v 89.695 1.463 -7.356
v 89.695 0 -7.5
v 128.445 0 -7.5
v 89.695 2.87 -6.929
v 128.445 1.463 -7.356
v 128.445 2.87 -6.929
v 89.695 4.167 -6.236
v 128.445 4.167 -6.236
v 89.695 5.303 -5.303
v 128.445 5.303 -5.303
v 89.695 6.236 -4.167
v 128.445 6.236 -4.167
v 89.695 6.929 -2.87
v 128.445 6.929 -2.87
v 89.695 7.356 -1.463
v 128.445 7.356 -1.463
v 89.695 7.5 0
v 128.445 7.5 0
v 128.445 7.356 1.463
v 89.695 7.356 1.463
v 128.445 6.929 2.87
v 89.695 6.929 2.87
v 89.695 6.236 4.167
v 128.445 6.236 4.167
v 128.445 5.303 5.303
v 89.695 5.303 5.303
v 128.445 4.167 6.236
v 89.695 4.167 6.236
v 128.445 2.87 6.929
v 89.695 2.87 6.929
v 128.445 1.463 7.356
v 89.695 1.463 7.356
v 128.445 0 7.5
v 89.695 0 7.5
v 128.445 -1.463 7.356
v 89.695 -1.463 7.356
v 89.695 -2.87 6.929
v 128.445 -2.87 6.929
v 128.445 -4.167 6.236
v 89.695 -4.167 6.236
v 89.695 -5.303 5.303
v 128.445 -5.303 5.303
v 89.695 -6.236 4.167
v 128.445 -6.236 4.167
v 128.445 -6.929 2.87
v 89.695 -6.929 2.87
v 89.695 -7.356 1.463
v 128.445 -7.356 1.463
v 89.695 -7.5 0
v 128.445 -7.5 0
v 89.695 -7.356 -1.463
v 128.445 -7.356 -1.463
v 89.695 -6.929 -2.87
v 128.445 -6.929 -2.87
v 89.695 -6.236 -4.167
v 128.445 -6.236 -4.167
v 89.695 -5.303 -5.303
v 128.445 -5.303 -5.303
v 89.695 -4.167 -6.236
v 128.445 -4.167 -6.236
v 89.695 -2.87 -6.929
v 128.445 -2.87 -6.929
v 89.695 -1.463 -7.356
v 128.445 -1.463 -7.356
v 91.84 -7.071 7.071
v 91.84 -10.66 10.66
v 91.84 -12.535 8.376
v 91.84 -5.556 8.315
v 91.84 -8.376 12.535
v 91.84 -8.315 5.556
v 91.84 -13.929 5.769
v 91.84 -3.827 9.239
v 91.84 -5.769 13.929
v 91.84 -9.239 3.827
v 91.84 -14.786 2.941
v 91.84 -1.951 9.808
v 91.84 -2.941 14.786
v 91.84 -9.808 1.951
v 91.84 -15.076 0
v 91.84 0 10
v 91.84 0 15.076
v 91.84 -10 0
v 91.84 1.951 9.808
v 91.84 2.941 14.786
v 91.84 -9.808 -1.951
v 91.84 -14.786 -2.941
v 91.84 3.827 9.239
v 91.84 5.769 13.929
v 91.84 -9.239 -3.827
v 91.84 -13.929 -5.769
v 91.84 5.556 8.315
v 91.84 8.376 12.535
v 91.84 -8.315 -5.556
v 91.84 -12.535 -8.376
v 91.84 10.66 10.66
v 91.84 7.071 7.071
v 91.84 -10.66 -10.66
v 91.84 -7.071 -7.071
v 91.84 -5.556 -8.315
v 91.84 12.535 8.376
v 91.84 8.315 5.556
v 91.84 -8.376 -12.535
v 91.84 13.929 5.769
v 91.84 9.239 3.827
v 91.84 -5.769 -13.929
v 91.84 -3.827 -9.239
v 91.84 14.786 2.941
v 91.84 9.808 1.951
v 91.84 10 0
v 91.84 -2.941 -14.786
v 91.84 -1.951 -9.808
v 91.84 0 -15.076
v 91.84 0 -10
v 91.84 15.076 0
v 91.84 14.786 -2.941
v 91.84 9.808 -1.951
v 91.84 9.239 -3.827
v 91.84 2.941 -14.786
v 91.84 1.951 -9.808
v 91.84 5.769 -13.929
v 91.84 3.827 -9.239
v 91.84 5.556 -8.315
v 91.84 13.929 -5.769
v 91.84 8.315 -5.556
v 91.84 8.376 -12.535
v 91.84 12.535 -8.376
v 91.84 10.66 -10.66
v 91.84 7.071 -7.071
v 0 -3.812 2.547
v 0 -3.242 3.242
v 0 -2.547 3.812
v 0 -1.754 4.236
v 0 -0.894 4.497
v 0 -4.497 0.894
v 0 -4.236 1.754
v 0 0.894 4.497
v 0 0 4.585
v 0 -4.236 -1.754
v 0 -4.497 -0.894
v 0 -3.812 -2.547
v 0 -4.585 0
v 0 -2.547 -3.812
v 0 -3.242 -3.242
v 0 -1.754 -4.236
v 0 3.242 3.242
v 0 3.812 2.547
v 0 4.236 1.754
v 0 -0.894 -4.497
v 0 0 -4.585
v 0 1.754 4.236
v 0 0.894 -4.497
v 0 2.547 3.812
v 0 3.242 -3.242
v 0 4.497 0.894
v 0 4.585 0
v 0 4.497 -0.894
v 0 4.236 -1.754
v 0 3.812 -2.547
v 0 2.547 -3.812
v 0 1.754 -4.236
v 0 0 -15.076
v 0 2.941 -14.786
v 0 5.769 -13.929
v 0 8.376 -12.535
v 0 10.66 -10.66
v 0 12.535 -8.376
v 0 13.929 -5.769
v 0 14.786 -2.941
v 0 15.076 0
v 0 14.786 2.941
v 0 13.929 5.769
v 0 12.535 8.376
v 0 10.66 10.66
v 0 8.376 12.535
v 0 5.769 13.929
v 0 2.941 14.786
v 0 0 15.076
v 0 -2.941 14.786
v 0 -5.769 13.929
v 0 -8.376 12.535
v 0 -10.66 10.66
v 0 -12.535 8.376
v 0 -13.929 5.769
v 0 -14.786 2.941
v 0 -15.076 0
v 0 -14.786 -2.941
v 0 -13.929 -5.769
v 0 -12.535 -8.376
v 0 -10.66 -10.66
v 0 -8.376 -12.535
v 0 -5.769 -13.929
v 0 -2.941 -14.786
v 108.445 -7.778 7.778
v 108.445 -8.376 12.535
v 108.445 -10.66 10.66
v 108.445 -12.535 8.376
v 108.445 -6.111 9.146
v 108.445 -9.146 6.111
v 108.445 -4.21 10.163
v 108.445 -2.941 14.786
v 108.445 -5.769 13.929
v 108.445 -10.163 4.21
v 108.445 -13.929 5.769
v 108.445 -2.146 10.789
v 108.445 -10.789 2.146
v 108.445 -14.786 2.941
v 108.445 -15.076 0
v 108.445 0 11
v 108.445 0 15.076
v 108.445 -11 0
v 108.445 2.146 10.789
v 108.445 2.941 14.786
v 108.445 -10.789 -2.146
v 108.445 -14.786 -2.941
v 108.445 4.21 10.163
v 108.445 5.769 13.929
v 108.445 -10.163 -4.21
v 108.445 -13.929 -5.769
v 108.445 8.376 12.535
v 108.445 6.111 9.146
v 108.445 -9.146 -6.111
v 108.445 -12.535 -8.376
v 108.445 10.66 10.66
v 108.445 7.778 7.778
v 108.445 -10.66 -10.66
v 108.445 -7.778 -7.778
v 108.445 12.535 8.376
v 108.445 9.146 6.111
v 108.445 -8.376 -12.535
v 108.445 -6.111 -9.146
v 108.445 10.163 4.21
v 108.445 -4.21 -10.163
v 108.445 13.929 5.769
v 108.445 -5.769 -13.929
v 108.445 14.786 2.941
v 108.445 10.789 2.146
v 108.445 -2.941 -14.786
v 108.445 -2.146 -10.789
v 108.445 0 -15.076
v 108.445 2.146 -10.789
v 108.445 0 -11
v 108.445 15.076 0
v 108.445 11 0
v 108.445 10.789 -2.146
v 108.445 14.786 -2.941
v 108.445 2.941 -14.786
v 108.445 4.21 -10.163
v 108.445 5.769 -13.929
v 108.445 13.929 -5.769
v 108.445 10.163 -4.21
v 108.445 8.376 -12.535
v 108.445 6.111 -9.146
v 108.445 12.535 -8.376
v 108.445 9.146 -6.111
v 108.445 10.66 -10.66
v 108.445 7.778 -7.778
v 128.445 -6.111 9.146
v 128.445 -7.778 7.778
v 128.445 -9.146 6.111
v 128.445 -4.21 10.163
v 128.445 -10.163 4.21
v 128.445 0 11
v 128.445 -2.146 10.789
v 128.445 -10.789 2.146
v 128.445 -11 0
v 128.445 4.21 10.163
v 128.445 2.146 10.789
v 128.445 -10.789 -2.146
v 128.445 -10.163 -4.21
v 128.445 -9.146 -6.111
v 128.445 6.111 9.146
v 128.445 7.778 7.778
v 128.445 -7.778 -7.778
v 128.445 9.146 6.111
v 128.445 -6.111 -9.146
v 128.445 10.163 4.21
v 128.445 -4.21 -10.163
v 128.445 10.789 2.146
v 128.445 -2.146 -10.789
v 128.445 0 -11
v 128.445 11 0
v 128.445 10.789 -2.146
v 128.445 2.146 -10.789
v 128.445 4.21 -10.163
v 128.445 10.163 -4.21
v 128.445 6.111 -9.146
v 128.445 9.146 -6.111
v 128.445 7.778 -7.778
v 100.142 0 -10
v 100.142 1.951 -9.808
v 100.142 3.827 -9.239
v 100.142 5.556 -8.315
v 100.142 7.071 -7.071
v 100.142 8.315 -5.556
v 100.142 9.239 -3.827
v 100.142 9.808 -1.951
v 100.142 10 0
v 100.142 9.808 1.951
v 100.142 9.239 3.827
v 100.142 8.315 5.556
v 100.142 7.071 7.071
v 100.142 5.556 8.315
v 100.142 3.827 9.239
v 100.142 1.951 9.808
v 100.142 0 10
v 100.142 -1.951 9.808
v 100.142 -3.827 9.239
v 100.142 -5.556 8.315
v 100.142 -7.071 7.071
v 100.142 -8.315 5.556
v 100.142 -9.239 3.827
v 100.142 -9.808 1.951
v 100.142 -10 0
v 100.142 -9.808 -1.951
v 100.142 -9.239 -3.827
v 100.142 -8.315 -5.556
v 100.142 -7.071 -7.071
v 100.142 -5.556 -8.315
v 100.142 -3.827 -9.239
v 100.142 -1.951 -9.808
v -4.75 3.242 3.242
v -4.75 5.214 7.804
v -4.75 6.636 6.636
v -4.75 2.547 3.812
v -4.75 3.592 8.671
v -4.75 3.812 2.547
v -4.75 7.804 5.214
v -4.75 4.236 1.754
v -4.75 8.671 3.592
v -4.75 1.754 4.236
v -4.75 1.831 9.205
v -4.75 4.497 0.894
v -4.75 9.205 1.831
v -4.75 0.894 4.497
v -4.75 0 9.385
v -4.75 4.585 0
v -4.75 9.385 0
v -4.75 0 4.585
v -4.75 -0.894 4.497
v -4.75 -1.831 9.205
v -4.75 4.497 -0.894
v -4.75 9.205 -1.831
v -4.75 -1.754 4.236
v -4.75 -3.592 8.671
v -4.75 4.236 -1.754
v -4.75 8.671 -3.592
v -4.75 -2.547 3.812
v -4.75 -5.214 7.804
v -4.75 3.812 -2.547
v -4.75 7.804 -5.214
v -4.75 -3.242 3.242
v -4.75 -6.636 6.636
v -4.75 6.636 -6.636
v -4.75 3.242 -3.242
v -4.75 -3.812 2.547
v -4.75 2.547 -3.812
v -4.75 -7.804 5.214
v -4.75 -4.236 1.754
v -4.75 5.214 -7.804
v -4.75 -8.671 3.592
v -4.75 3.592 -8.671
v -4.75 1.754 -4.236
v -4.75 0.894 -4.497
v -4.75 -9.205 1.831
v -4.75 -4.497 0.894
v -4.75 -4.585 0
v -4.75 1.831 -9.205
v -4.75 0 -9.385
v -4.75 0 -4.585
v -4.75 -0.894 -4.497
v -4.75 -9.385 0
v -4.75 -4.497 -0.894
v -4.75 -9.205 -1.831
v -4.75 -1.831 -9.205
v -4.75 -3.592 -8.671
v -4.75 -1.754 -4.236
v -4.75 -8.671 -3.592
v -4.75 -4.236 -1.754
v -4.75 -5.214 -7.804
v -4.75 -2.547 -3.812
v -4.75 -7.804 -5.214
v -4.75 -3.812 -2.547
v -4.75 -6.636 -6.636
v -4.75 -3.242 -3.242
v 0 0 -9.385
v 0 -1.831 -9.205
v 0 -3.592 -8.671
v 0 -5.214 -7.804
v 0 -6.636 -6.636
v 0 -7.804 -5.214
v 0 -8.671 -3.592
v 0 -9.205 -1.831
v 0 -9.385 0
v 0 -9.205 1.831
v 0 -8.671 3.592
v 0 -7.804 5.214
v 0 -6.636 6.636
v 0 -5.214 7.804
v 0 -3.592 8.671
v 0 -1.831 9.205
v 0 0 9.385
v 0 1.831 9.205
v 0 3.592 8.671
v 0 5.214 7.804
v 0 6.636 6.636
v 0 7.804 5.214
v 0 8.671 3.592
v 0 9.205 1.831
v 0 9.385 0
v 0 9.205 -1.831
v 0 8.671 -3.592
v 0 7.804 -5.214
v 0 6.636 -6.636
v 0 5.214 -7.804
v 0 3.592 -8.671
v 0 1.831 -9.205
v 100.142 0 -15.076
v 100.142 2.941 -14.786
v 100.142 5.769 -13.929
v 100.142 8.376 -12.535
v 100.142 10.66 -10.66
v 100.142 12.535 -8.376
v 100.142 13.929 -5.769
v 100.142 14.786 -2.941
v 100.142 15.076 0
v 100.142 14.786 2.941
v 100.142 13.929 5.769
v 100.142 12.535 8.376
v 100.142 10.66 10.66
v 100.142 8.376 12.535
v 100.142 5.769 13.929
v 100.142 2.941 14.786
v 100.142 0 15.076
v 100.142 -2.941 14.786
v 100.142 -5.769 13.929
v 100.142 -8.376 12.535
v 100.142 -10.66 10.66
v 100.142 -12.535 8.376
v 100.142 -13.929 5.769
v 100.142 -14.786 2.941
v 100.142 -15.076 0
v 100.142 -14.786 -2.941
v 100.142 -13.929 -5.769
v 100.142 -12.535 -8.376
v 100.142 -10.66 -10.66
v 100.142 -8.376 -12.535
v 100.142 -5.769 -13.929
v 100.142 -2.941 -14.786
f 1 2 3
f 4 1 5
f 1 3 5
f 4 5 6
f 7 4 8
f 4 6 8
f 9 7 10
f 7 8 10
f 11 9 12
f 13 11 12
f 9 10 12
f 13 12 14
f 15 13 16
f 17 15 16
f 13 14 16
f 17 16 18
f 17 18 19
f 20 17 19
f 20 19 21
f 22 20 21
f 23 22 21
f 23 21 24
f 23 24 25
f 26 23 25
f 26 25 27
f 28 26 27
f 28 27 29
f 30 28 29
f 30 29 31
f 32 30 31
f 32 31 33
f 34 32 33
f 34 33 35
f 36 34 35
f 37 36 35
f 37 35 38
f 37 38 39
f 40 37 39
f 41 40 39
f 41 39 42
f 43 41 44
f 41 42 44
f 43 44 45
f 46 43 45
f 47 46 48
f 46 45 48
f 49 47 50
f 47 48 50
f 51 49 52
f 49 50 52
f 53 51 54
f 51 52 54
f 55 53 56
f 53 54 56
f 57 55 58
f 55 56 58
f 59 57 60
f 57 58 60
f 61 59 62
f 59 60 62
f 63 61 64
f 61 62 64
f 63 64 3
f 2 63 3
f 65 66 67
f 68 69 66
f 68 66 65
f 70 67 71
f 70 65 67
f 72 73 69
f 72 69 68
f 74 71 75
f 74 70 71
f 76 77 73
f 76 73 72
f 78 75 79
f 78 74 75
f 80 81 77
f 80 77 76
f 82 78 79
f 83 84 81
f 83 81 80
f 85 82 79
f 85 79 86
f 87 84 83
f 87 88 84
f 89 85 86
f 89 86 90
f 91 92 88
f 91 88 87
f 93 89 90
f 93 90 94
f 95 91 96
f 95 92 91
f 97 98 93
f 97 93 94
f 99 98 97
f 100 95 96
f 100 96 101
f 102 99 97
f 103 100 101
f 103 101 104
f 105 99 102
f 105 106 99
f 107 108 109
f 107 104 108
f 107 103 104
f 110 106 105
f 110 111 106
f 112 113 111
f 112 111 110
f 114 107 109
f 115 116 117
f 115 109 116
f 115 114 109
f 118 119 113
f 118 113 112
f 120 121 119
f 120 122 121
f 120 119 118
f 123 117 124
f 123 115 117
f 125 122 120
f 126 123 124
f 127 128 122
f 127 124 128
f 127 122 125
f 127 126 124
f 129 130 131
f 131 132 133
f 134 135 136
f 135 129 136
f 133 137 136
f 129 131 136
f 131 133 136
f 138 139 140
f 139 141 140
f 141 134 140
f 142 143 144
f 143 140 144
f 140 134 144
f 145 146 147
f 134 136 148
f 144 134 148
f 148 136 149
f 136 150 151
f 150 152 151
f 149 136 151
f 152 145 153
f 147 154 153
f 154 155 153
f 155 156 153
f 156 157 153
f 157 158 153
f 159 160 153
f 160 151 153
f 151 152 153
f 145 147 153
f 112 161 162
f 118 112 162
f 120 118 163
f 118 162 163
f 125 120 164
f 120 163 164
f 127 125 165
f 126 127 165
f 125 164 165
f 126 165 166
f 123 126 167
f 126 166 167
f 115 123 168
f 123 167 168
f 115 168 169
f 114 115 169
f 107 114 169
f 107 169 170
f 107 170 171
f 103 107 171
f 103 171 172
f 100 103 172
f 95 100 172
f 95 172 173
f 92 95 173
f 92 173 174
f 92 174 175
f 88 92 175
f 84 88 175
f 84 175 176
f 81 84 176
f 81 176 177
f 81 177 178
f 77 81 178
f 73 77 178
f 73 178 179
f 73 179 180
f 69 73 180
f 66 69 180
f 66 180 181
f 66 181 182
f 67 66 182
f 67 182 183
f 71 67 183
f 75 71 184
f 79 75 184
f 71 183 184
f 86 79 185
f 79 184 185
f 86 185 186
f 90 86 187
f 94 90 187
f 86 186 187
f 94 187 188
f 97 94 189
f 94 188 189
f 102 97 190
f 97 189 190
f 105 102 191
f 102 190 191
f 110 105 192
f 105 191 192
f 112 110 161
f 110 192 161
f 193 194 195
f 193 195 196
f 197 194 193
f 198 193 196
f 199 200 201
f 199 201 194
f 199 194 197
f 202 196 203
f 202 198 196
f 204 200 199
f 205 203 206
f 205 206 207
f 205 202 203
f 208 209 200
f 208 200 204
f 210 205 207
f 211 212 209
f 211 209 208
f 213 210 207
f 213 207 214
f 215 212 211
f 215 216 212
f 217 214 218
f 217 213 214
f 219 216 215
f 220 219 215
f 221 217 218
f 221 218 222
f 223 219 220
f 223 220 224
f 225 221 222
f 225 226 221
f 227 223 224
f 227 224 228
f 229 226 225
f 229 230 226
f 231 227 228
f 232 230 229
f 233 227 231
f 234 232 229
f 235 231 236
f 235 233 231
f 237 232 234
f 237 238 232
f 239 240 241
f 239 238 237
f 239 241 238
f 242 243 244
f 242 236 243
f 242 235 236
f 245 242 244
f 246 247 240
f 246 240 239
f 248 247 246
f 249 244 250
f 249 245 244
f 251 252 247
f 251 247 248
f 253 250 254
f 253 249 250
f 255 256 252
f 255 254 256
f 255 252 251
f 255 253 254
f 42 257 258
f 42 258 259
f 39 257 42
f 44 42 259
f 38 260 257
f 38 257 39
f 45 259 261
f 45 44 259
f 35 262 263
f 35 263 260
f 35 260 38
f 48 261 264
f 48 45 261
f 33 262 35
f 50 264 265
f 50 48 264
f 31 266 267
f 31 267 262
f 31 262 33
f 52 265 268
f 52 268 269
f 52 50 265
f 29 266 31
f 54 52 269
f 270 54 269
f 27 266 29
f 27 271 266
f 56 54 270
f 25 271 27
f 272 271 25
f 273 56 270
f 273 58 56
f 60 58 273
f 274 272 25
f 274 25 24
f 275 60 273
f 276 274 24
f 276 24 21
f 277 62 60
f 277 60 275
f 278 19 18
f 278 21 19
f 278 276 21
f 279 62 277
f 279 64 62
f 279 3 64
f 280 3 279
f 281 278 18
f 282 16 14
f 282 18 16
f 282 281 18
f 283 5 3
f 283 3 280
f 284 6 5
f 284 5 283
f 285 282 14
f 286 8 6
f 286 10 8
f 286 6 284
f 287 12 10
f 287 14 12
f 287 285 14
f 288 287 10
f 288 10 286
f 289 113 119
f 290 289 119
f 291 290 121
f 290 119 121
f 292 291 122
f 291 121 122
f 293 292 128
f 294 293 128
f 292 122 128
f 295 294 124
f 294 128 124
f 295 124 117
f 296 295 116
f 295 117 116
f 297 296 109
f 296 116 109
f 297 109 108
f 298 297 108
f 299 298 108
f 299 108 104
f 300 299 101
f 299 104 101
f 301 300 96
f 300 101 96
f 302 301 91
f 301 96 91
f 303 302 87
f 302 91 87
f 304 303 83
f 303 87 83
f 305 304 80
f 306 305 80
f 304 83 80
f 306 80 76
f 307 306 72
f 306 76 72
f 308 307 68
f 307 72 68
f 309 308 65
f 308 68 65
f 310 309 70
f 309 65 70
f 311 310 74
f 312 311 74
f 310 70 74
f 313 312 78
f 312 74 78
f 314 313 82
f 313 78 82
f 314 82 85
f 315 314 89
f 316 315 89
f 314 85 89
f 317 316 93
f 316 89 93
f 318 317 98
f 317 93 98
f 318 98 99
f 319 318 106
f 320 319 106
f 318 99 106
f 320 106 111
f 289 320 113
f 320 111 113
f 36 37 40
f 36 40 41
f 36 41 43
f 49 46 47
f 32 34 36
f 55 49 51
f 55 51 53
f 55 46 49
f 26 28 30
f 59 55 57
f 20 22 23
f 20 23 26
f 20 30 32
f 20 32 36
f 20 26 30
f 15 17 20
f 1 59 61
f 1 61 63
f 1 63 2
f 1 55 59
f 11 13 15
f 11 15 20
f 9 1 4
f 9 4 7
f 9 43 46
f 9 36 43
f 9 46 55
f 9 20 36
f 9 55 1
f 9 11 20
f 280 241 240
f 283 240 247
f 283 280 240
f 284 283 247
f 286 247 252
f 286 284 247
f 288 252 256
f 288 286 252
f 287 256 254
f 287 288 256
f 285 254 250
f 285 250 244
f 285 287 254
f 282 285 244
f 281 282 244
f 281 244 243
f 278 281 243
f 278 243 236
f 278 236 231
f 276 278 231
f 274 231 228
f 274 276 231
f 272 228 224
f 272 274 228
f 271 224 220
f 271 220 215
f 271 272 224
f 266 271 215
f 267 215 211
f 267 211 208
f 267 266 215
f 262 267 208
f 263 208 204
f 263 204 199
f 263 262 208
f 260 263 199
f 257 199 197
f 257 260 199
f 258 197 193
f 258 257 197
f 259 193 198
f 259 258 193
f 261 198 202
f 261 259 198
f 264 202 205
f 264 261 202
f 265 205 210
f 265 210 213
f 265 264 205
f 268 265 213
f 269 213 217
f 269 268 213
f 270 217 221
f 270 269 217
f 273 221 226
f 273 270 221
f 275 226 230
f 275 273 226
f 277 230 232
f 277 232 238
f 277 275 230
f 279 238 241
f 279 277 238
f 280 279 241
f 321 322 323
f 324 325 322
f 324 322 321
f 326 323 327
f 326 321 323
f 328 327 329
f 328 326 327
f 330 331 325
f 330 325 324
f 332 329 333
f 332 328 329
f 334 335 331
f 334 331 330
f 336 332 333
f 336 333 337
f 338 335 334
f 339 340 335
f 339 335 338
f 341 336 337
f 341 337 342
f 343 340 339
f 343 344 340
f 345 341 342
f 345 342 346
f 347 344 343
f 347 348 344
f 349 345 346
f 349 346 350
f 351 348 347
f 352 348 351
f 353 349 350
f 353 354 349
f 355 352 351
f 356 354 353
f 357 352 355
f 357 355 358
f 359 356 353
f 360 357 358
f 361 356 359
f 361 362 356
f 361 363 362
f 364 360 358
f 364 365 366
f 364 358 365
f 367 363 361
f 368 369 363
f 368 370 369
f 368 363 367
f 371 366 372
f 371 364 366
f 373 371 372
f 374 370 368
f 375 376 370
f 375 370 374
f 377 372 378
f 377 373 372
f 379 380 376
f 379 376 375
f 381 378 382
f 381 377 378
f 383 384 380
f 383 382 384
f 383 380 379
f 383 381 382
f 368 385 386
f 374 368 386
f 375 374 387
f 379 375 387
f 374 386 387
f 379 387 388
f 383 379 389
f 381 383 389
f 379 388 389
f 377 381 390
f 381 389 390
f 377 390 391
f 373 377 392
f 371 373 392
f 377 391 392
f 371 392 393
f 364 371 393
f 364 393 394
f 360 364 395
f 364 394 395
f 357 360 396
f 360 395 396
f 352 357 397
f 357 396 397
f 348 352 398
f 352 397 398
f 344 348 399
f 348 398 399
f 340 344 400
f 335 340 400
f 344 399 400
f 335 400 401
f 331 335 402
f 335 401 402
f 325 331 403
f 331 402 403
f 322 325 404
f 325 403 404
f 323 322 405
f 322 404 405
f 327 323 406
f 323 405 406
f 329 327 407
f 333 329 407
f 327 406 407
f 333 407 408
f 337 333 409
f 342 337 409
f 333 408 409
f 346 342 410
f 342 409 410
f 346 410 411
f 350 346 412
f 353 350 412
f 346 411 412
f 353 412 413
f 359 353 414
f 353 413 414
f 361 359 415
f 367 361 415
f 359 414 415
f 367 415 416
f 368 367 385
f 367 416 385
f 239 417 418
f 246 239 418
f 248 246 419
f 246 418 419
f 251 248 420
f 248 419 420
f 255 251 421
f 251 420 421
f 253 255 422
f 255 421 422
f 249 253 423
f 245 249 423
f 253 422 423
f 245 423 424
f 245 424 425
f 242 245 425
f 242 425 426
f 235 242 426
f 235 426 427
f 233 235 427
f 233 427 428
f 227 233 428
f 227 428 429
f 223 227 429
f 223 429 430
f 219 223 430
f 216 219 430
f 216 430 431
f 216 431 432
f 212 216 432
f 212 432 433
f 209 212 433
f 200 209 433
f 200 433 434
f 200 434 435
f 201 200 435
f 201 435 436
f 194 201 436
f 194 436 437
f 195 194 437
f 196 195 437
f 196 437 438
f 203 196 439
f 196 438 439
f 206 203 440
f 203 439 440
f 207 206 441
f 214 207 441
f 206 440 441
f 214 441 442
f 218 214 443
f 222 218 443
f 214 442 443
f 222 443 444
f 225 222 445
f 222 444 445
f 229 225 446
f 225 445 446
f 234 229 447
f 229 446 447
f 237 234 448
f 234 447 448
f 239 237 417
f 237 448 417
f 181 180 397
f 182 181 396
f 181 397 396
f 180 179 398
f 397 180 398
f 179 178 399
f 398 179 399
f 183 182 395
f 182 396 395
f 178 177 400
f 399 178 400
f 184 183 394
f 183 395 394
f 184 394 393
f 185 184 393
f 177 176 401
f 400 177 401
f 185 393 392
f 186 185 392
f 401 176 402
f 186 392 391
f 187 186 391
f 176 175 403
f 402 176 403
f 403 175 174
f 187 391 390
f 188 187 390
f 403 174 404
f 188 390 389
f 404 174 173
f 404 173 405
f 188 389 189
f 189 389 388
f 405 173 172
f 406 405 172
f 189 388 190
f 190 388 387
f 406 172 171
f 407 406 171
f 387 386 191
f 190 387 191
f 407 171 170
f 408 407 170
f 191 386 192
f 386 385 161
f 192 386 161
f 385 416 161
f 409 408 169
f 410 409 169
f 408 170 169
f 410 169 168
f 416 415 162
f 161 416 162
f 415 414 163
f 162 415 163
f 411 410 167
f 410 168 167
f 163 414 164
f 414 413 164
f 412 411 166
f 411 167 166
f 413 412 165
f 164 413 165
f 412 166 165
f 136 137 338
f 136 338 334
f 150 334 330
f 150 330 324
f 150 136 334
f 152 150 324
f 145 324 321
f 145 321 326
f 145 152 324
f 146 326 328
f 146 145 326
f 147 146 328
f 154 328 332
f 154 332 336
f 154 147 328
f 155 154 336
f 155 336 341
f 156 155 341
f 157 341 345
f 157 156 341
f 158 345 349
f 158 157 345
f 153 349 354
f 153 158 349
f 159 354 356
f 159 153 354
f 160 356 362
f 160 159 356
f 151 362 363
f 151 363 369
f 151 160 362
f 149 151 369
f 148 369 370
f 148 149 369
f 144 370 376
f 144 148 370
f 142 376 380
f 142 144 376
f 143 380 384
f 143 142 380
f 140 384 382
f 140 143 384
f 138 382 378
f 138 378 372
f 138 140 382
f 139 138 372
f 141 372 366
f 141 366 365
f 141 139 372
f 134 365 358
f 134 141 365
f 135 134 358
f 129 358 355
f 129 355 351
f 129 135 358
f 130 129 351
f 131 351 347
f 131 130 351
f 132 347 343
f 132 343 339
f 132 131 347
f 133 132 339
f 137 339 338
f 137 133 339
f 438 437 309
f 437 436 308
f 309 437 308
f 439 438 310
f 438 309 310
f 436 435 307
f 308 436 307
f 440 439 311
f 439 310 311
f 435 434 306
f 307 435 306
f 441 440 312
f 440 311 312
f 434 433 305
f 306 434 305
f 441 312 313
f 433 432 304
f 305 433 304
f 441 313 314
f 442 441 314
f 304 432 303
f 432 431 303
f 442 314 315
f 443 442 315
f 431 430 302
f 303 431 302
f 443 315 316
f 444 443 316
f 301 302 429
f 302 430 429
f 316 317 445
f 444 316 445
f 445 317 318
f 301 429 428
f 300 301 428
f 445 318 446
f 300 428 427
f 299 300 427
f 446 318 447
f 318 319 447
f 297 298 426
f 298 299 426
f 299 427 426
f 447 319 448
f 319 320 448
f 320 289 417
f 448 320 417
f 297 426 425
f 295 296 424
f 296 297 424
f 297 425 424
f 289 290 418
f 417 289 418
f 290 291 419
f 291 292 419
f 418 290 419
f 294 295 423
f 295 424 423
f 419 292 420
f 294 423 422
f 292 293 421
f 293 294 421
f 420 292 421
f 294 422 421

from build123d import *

# Parameters (mm, degrees)
SKETCH1_R           = 15.07617
BOSS_EXTRUDE1_DEPTH = 108.4446395
SKETCH2_R           = 9.3853
SKETCH2_R_2         = 4.5847
BOSS_EXTRUDE2_DEPTH = 4.7498
SKETCH3_R           = 7.5
CUT_EXTRUDE1_DEPTH  = 18.75
BOSS_EXTRUDE3_START = 20
SKETCH4_R           = 11
SKETCH4_R_2         = 7.5
BOSS_EXTRUDE3_DEPTH = 20
CUT_EXTRUDE4_START  = -8.3023864
SKETCH5_R           = 15.07617
SKETCH5_R_2         = 10
CUT_EXTRUDE4_DEPTH  = 8.3023864


with BuildPart() as part:
    # Sketch1 → Boss-Extrude1 (new body)
    with BuildSketch(Plane(origin=(0, 0, 0), x_dir=(0, 0, -1), z_dir=(1, 0, 0))):
        Circle(SKETCH1_R)
    extrude(amount=BOSS_EXTRUDE1_DEPTH)

    # Sketch2 → Boss-Extrude2 (add)
    with BuildSketch(Plane.ZY):
        with Locations(Location((0, 0, 0), (0, 0, 180))):
            Circle(SKETCH2_R)
        Circle(SKETCH2_R_2, mode=Mode.SUBTRACT)
    extrude(amount=BOSS_EXTRUDE2_DEPTH)

    # Sketch3 → Cut-Extrude1 (cut)
    with BuildSketch(Plane(origin=(108.4446395, 0, 0), x_dir=(0, 0, -1), z_dir=(1, 0, 0))):
        Circle(SKETCH3_R)
    extrude(amount=-CUT_EXTRUDE1_DEPTH, mode=Mode.SUBTRACT)

    # Sketch4 → Boss-Extrude3 (add)
    with BuildSketch(Plane(origin=(108.4446395, 0, 0), x_dir=(0, 0, -1), z_dir=(1, 0, 0)).offset(BOSS_EXTRUDE3_START)):
        Circle(SKETCH4_R)
        Circle(SKETCH4_R_2, mode=Mode.SUBTRACT)
    extrude(amount=-BOSS_EXTRUDE3_DEPTH)

    # Sketch5 → Cut-Extrude4 (cut)
    with BuildSketch(Plane(origin=(100.1422531, 0, 0), x_dir=(0, 0, -1), z_dir=(1, 0, 0)).offset(CUT_EXTRUDE4_START)):
        Circle(SKETCH5_R)
        Circle(SKETCH5_R_2, mode=Mode.SUBTRACT)
    extrude(amount=CUT_EXTRUDE4_DEPTH, mode=Mode.SUBTRACT)


solid = part.part
